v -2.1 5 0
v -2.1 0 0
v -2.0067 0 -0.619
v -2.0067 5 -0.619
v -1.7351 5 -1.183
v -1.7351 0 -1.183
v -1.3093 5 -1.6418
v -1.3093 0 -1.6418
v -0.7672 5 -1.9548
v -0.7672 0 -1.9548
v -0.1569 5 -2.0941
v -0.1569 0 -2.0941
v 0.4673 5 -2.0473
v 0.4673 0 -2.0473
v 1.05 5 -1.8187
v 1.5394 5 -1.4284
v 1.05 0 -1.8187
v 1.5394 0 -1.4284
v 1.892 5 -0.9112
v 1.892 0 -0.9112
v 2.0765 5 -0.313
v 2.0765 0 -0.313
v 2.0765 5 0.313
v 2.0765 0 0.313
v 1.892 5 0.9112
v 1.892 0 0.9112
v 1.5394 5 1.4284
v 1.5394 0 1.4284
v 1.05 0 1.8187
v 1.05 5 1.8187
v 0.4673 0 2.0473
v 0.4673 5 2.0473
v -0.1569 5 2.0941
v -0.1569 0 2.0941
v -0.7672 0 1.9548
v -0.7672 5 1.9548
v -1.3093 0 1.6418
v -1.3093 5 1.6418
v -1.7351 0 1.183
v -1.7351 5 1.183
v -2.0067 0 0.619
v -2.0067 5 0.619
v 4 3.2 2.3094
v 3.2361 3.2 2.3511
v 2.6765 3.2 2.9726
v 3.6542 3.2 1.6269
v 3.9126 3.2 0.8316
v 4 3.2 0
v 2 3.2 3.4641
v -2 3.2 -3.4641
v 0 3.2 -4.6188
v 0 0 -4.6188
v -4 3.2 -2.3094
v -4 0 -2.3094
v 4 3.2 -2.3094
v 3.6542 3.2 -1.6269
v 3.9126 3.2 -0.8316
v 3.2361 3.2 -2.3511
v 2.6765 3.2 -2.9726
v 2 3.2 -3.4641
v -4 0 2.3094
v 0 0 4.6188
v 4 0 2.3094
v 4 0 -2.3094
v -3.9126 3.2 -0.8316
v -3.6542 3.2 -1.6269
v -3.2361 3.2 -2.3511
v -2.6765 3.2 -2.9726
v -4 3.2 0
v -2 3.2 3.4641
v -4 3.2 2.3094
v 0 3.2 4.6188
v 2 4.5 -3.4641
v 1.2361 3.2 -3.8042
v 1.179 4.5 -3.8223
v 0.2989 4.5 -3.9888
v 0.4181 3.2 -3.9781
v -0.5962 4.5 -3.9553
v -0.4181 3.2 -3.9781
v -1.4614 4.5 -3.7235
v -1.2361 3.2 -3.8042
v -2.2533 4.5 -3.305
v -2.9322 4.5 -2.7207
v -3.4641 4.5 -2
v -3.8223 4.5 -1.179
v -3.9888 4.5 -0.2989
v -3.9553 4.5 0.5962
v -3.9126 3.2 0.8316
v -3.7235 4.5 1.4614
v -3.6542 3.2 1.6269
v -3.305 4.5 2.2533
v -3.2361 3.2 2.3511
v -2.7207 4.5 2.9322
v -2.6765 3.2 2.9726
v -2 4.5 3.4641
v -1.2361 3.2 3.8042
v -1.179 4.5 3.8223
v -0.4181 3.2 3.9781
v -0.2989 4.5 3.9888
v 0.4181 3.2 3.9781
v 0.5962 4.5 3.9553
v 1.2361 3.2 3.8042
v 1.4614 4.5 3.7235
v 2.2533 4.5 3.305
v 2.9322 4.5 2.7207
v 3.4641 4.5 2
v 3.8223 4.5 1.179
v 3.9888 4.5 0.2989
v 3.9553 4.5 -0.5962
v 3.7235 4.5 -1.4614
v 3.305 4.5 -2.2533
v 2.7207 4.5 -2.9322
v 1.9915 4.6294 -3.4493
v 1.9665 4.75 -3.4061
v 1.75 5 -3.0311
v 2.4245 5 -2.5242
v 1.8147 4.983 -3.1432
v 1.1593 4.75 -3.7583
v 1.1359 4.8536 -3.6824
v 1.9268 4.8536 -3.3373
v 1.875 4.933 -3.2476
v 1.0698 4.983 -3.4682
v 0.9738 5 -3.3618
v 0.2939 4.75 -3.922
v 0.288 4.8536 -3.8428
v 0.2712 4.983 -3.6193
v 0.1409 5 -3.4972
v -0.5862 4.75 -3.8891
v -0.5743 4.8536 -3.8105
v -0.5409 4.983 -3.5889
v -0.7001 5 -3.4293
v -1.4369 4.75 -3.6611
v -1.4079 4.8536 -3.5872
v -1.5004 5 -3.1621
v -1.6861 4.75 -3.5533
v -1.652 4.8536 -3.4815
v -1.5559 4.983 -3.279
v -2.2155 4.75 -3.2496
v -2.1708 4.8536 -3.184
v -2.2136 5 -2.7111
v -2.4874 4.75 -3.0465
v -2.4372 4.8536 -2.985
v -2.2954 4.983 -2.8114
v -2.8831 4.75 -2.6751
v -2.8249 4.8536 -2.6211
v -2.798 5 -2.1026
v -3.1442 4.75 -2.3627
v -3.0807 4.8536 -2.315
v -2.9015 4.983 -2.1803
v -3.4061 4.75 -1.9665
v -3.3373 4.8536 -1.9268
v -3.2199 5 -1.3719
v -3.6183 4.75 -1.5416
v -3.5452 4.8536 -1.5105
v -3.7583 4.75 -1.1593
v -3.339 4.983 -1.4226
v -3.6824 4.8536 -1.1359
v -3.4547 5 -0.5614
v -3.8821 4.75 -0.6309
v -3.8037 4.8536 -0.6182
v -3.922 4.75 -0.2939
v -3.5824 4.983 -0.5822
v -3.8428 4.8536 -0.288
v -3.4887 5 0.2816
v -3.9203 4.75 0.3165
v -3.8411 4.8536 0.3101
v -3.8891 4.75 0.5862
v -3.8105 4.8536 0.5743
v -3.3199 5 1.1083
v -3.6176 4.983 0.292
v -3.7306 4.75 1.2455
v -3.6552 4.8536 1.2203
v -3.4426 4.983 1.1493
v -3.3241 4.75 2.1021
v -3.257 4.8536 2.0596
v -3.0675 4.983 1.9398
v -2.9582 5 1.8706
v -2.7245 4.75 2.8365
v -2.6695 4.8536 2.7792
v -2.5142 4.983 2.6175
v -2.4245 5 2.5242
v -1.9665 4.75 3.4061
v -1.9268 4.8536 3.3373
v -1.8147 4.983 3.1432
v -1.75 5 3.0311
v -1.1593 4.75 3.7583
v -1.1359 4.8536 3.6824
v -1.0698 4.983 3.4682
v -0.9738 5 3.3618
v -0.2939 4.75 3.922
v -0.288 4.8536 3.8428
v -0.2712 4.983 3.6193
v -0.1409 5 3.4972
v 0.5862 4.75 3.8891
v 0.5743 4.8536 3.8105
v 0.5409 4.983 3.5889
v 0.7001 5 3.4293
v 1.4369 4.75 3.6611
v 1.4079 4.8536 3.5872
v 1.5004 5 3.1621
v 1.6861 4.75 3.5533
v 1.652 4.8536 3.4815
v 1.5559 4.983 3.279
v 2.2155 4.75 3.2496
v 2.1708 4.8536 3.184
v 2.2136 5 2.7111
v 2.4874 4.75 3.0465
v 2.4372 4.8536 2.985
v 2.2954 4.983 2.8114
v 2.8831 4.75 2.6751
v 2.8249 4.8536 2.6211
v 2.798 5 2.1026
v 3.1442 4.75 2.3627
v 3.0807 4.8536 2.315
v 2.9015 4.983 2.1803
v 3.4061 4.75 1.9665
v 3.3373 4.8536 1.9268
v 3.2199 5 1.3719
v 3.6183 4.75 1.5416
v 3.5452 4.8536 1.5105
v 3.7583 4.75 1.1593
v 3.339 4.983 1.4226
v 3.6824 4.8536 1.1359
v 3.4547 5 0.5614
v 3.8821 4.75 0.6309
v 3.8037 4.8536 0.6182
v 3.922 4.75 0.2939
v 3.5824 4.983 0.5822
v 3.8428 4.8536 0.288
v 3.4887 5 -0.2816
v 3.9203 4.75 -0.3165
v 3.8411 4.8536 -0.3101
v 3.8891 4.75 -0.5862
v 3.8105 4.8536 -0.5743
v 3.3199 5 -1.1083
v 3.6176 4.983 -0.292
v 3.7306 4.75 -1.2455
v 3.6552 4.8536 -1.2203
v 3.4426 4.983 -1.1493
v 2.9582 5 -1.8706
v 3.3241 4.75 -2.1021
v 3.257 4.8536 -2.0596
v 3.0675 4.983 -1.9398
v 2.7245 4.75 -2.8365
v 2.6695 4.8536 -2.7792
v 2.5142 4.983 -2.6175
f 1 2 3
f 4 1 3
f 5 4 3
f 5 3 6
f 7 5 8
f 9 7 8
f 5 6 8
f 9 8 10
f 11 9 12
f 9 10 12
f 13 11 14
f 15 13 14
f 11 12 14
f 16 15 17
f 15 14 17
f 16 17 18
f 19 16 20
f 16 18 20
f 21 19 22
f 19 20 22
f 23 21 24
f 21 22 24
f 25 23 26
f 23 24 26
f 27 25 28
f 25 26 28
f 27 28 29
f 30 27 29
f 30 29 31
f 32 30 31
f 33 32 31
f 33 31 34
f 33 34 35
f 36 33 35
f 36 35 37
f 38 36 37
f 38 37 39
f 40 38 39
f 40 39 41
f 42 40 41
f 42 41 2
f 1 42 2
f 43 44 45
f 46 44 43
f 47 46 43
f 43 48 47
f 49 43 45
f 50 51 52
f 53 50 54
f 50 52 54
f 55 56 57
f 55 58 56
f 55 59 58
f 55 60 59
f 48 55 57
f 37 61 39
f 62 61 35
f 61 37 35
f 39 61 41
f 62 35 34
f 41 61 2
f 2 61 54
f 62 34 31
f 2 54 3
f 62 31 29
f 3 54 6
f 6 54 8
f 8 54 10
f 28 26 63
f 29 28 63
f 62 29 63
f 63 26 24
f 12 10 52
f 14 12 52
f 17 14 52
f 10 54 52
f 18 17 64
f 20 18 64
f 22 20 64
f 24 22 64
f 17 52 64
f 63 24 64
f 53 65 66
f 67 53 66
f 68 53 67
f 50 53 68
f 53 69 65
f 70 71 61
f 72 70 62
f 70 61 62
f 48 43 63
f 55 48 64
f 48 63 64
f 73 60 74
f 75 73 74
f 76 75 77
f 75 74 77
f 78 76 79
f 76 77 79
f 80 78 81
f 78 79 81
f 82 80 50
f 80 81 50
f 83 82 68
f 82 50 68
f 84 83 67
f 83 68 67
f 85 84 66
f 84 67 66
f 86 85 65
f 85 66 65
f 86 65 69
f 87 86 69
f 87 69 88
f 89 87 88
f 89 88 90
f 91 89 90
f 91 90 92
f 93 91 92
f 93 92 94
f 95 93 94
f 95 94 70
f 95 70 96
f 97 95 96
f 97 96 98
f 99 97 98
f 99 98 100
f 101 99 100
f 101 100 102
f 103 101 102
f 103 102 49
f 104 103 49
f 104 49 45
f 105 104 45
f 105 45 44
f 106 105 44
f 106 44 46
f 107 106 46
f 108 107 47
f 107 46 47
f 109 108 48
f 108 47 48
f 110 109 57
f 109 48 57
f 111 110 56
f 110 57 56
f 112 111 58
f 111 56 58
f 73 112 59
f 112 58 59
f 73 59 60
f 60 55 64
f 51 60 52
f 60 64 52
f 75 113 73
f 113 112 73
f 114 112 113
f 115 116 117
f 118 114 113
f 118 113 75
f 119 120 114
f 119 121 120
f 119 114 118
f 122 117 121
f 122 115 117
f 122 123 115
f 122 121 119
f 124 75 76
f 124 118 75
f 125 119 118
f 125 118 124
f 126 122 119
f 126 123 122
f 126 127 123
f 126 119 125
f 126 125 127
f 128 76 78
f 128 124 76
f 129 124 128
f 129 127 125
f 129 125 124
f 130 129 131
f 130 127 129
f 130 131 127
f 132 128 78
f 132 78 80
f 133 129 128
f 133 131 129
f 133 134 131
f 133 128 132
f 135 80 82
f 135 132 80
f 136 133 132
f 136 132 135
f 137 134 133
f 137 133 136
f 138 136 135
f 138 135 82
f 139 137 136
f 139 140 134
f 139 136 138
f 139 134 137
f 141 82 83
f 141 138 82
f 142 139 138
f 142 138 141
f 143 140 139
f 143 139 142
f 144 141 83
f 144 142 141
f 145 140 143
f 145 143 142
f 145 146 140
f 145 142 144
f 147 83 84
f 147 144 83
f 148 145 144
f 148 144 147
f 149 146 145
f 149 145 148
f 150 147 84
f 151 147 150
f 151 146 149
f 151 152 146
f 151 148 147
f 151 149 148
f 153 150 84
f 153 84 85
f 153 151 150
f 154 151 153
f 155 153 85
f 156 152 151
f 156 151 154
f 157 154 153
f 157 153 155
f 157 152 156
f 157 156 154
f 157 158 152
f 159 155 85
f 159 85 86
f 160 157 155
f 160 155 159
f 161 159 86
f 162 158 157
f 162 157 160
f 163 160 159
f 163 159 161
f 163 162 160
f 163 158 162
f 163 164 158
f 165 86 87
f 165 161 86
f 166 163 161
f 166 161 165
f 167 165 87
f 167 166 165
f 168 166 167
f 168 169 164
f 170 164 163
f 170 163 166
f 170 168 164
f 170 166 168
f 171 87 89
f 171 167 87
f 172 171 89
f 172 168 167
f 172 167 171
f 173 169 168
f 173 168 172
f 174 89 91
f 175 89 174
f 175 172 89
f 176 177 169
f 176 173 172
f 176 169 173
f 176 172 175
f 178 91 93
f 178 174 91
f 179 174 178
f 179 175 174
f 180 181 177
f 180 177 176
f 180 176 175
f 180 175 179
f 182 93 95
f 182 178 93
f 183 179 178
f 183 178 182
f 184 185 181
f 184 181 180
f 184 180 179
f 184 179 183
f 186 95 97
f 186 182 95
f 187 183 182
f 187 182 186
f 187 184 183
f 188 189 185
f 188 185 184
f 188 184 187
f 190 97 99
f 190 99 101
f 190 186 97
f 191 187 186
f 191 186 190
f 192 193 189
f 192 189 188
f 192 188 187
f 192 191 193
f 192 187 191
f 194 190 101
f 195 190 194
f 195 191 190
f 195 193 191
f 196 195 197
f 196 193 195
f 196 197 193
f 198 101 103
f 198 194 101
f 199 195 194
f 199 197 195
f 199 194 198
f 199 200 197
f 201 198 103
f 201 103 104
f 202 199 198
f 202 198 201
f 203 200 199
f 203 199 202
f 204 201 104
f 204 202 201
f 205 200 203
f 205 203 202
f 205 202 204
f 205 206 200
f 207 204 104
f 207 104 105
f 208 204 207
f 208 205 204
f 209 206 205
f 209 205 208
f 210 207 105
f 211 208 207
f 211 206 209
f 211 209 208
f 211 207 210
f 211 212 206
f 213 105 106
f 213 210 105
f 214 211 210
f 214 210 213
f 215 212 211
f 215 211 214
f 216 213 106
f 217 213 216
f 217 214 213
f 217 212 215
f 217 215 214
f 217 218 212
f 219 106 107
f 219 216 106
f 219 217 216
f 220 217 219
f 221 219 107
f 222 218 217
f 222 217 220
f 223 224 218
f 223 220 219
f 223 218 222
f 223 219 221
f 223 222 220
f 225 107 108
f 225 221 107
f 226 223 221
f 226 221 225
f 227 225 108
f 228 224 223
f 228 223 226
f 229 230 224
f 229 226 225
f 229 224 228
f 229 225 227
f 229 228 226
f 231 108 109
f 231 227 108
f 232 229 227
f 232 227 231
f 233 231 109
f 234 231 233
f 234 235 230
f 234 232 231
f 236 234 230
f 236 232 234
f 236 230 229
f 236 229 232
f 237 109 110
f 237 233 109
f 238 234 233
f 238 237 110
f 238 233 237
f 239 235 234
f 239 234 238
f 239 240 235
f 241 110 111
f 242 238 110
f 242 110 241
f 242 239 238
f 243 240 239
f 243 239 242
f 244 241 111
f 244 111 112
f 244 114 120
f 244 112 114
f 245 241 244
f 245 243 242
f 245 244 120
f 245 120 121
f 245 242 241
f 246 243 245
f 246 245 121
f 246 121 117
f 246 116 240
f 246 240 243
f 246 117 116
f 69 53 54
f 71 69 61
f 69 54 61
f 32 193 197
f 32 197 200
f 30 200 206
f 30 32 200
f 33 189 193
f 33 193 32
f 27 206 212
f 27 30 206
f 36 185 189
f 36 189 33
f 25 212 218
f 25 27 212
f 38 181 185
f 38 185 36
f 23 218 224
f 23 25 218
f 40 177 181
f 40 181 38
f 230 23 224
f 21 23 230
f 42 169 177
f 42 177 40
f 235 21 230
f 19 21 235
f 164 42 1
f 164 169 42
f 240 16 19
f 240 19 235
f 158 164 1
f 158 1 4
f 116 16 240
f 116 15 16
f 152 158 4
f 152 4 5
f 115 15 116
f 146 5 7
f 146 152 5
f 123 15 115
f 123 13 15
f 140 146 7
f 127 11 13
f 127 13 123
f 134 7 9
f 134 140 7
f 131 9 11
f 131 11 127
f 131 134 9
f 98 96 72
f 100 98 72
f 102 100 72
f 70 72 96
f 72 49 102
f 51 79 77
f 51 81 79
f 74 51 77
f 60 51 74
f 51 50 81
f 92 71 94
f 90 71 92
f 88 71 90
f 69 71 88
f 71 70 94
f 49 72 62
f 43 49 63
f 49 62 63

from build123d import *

# Parameters (mm, degrees)
EXTRUDE_1_DEPTH    = 3.2
SKETCH_2_R         = 4
EXTRUDE_2_DEPTH    = 1.8
FILLET_1_R         = 0.5
HOLE_WIZARD_M5_1_D = 4.2


with BuildPart() as part:
    # 草图1 → 凸台-拉伸1 (new body)
    with BuildSketch(Plane(origin=(0, 0, 0), x_dir=(1, 0, 0), z_dir=(0, 1, 0))):
        Polygon((0, 4.618802154), (-4, 2.309401077), (-4, -2.309401077), (0, -4.618802154), (4, -2.309401077), (4, 2.309401077), align=None)
    extrude(amount=EXTRUDE_1_DEPTH)

    # 草图2 → 凸台-拉伸2 (add)
    with BuildSketch(Plane(origin=(0, 3.2, 0), x_dir=(1, 0, 0), z_dir=(0, 1, 0))):
        with Locations(Location((0, 0, 0), (0, 0, 60))):
            Circle(SKETCH_2_R)
    extrude(amount=EXTRUDE_2_DEPTH)

    # 圆角1
    fillet_1_edges = [part.edges().sort_by_distance(p)[0] for p in [
        (-2, 5, 3.464101615),
    ]]
    fillet(fillet_1_edges, radius=FILLET_1_R)

    # M5 螺纹孔1 (through all)
    with Locations(Plane(origin=(0, 5, 0), x_dir=(1, 0, 0), z_dir=(0, 1, 0))):
        with Locations((0, 0)):
            Hole(HOLE_WIZARD_M5_1_D / 2)


solid = part.part
